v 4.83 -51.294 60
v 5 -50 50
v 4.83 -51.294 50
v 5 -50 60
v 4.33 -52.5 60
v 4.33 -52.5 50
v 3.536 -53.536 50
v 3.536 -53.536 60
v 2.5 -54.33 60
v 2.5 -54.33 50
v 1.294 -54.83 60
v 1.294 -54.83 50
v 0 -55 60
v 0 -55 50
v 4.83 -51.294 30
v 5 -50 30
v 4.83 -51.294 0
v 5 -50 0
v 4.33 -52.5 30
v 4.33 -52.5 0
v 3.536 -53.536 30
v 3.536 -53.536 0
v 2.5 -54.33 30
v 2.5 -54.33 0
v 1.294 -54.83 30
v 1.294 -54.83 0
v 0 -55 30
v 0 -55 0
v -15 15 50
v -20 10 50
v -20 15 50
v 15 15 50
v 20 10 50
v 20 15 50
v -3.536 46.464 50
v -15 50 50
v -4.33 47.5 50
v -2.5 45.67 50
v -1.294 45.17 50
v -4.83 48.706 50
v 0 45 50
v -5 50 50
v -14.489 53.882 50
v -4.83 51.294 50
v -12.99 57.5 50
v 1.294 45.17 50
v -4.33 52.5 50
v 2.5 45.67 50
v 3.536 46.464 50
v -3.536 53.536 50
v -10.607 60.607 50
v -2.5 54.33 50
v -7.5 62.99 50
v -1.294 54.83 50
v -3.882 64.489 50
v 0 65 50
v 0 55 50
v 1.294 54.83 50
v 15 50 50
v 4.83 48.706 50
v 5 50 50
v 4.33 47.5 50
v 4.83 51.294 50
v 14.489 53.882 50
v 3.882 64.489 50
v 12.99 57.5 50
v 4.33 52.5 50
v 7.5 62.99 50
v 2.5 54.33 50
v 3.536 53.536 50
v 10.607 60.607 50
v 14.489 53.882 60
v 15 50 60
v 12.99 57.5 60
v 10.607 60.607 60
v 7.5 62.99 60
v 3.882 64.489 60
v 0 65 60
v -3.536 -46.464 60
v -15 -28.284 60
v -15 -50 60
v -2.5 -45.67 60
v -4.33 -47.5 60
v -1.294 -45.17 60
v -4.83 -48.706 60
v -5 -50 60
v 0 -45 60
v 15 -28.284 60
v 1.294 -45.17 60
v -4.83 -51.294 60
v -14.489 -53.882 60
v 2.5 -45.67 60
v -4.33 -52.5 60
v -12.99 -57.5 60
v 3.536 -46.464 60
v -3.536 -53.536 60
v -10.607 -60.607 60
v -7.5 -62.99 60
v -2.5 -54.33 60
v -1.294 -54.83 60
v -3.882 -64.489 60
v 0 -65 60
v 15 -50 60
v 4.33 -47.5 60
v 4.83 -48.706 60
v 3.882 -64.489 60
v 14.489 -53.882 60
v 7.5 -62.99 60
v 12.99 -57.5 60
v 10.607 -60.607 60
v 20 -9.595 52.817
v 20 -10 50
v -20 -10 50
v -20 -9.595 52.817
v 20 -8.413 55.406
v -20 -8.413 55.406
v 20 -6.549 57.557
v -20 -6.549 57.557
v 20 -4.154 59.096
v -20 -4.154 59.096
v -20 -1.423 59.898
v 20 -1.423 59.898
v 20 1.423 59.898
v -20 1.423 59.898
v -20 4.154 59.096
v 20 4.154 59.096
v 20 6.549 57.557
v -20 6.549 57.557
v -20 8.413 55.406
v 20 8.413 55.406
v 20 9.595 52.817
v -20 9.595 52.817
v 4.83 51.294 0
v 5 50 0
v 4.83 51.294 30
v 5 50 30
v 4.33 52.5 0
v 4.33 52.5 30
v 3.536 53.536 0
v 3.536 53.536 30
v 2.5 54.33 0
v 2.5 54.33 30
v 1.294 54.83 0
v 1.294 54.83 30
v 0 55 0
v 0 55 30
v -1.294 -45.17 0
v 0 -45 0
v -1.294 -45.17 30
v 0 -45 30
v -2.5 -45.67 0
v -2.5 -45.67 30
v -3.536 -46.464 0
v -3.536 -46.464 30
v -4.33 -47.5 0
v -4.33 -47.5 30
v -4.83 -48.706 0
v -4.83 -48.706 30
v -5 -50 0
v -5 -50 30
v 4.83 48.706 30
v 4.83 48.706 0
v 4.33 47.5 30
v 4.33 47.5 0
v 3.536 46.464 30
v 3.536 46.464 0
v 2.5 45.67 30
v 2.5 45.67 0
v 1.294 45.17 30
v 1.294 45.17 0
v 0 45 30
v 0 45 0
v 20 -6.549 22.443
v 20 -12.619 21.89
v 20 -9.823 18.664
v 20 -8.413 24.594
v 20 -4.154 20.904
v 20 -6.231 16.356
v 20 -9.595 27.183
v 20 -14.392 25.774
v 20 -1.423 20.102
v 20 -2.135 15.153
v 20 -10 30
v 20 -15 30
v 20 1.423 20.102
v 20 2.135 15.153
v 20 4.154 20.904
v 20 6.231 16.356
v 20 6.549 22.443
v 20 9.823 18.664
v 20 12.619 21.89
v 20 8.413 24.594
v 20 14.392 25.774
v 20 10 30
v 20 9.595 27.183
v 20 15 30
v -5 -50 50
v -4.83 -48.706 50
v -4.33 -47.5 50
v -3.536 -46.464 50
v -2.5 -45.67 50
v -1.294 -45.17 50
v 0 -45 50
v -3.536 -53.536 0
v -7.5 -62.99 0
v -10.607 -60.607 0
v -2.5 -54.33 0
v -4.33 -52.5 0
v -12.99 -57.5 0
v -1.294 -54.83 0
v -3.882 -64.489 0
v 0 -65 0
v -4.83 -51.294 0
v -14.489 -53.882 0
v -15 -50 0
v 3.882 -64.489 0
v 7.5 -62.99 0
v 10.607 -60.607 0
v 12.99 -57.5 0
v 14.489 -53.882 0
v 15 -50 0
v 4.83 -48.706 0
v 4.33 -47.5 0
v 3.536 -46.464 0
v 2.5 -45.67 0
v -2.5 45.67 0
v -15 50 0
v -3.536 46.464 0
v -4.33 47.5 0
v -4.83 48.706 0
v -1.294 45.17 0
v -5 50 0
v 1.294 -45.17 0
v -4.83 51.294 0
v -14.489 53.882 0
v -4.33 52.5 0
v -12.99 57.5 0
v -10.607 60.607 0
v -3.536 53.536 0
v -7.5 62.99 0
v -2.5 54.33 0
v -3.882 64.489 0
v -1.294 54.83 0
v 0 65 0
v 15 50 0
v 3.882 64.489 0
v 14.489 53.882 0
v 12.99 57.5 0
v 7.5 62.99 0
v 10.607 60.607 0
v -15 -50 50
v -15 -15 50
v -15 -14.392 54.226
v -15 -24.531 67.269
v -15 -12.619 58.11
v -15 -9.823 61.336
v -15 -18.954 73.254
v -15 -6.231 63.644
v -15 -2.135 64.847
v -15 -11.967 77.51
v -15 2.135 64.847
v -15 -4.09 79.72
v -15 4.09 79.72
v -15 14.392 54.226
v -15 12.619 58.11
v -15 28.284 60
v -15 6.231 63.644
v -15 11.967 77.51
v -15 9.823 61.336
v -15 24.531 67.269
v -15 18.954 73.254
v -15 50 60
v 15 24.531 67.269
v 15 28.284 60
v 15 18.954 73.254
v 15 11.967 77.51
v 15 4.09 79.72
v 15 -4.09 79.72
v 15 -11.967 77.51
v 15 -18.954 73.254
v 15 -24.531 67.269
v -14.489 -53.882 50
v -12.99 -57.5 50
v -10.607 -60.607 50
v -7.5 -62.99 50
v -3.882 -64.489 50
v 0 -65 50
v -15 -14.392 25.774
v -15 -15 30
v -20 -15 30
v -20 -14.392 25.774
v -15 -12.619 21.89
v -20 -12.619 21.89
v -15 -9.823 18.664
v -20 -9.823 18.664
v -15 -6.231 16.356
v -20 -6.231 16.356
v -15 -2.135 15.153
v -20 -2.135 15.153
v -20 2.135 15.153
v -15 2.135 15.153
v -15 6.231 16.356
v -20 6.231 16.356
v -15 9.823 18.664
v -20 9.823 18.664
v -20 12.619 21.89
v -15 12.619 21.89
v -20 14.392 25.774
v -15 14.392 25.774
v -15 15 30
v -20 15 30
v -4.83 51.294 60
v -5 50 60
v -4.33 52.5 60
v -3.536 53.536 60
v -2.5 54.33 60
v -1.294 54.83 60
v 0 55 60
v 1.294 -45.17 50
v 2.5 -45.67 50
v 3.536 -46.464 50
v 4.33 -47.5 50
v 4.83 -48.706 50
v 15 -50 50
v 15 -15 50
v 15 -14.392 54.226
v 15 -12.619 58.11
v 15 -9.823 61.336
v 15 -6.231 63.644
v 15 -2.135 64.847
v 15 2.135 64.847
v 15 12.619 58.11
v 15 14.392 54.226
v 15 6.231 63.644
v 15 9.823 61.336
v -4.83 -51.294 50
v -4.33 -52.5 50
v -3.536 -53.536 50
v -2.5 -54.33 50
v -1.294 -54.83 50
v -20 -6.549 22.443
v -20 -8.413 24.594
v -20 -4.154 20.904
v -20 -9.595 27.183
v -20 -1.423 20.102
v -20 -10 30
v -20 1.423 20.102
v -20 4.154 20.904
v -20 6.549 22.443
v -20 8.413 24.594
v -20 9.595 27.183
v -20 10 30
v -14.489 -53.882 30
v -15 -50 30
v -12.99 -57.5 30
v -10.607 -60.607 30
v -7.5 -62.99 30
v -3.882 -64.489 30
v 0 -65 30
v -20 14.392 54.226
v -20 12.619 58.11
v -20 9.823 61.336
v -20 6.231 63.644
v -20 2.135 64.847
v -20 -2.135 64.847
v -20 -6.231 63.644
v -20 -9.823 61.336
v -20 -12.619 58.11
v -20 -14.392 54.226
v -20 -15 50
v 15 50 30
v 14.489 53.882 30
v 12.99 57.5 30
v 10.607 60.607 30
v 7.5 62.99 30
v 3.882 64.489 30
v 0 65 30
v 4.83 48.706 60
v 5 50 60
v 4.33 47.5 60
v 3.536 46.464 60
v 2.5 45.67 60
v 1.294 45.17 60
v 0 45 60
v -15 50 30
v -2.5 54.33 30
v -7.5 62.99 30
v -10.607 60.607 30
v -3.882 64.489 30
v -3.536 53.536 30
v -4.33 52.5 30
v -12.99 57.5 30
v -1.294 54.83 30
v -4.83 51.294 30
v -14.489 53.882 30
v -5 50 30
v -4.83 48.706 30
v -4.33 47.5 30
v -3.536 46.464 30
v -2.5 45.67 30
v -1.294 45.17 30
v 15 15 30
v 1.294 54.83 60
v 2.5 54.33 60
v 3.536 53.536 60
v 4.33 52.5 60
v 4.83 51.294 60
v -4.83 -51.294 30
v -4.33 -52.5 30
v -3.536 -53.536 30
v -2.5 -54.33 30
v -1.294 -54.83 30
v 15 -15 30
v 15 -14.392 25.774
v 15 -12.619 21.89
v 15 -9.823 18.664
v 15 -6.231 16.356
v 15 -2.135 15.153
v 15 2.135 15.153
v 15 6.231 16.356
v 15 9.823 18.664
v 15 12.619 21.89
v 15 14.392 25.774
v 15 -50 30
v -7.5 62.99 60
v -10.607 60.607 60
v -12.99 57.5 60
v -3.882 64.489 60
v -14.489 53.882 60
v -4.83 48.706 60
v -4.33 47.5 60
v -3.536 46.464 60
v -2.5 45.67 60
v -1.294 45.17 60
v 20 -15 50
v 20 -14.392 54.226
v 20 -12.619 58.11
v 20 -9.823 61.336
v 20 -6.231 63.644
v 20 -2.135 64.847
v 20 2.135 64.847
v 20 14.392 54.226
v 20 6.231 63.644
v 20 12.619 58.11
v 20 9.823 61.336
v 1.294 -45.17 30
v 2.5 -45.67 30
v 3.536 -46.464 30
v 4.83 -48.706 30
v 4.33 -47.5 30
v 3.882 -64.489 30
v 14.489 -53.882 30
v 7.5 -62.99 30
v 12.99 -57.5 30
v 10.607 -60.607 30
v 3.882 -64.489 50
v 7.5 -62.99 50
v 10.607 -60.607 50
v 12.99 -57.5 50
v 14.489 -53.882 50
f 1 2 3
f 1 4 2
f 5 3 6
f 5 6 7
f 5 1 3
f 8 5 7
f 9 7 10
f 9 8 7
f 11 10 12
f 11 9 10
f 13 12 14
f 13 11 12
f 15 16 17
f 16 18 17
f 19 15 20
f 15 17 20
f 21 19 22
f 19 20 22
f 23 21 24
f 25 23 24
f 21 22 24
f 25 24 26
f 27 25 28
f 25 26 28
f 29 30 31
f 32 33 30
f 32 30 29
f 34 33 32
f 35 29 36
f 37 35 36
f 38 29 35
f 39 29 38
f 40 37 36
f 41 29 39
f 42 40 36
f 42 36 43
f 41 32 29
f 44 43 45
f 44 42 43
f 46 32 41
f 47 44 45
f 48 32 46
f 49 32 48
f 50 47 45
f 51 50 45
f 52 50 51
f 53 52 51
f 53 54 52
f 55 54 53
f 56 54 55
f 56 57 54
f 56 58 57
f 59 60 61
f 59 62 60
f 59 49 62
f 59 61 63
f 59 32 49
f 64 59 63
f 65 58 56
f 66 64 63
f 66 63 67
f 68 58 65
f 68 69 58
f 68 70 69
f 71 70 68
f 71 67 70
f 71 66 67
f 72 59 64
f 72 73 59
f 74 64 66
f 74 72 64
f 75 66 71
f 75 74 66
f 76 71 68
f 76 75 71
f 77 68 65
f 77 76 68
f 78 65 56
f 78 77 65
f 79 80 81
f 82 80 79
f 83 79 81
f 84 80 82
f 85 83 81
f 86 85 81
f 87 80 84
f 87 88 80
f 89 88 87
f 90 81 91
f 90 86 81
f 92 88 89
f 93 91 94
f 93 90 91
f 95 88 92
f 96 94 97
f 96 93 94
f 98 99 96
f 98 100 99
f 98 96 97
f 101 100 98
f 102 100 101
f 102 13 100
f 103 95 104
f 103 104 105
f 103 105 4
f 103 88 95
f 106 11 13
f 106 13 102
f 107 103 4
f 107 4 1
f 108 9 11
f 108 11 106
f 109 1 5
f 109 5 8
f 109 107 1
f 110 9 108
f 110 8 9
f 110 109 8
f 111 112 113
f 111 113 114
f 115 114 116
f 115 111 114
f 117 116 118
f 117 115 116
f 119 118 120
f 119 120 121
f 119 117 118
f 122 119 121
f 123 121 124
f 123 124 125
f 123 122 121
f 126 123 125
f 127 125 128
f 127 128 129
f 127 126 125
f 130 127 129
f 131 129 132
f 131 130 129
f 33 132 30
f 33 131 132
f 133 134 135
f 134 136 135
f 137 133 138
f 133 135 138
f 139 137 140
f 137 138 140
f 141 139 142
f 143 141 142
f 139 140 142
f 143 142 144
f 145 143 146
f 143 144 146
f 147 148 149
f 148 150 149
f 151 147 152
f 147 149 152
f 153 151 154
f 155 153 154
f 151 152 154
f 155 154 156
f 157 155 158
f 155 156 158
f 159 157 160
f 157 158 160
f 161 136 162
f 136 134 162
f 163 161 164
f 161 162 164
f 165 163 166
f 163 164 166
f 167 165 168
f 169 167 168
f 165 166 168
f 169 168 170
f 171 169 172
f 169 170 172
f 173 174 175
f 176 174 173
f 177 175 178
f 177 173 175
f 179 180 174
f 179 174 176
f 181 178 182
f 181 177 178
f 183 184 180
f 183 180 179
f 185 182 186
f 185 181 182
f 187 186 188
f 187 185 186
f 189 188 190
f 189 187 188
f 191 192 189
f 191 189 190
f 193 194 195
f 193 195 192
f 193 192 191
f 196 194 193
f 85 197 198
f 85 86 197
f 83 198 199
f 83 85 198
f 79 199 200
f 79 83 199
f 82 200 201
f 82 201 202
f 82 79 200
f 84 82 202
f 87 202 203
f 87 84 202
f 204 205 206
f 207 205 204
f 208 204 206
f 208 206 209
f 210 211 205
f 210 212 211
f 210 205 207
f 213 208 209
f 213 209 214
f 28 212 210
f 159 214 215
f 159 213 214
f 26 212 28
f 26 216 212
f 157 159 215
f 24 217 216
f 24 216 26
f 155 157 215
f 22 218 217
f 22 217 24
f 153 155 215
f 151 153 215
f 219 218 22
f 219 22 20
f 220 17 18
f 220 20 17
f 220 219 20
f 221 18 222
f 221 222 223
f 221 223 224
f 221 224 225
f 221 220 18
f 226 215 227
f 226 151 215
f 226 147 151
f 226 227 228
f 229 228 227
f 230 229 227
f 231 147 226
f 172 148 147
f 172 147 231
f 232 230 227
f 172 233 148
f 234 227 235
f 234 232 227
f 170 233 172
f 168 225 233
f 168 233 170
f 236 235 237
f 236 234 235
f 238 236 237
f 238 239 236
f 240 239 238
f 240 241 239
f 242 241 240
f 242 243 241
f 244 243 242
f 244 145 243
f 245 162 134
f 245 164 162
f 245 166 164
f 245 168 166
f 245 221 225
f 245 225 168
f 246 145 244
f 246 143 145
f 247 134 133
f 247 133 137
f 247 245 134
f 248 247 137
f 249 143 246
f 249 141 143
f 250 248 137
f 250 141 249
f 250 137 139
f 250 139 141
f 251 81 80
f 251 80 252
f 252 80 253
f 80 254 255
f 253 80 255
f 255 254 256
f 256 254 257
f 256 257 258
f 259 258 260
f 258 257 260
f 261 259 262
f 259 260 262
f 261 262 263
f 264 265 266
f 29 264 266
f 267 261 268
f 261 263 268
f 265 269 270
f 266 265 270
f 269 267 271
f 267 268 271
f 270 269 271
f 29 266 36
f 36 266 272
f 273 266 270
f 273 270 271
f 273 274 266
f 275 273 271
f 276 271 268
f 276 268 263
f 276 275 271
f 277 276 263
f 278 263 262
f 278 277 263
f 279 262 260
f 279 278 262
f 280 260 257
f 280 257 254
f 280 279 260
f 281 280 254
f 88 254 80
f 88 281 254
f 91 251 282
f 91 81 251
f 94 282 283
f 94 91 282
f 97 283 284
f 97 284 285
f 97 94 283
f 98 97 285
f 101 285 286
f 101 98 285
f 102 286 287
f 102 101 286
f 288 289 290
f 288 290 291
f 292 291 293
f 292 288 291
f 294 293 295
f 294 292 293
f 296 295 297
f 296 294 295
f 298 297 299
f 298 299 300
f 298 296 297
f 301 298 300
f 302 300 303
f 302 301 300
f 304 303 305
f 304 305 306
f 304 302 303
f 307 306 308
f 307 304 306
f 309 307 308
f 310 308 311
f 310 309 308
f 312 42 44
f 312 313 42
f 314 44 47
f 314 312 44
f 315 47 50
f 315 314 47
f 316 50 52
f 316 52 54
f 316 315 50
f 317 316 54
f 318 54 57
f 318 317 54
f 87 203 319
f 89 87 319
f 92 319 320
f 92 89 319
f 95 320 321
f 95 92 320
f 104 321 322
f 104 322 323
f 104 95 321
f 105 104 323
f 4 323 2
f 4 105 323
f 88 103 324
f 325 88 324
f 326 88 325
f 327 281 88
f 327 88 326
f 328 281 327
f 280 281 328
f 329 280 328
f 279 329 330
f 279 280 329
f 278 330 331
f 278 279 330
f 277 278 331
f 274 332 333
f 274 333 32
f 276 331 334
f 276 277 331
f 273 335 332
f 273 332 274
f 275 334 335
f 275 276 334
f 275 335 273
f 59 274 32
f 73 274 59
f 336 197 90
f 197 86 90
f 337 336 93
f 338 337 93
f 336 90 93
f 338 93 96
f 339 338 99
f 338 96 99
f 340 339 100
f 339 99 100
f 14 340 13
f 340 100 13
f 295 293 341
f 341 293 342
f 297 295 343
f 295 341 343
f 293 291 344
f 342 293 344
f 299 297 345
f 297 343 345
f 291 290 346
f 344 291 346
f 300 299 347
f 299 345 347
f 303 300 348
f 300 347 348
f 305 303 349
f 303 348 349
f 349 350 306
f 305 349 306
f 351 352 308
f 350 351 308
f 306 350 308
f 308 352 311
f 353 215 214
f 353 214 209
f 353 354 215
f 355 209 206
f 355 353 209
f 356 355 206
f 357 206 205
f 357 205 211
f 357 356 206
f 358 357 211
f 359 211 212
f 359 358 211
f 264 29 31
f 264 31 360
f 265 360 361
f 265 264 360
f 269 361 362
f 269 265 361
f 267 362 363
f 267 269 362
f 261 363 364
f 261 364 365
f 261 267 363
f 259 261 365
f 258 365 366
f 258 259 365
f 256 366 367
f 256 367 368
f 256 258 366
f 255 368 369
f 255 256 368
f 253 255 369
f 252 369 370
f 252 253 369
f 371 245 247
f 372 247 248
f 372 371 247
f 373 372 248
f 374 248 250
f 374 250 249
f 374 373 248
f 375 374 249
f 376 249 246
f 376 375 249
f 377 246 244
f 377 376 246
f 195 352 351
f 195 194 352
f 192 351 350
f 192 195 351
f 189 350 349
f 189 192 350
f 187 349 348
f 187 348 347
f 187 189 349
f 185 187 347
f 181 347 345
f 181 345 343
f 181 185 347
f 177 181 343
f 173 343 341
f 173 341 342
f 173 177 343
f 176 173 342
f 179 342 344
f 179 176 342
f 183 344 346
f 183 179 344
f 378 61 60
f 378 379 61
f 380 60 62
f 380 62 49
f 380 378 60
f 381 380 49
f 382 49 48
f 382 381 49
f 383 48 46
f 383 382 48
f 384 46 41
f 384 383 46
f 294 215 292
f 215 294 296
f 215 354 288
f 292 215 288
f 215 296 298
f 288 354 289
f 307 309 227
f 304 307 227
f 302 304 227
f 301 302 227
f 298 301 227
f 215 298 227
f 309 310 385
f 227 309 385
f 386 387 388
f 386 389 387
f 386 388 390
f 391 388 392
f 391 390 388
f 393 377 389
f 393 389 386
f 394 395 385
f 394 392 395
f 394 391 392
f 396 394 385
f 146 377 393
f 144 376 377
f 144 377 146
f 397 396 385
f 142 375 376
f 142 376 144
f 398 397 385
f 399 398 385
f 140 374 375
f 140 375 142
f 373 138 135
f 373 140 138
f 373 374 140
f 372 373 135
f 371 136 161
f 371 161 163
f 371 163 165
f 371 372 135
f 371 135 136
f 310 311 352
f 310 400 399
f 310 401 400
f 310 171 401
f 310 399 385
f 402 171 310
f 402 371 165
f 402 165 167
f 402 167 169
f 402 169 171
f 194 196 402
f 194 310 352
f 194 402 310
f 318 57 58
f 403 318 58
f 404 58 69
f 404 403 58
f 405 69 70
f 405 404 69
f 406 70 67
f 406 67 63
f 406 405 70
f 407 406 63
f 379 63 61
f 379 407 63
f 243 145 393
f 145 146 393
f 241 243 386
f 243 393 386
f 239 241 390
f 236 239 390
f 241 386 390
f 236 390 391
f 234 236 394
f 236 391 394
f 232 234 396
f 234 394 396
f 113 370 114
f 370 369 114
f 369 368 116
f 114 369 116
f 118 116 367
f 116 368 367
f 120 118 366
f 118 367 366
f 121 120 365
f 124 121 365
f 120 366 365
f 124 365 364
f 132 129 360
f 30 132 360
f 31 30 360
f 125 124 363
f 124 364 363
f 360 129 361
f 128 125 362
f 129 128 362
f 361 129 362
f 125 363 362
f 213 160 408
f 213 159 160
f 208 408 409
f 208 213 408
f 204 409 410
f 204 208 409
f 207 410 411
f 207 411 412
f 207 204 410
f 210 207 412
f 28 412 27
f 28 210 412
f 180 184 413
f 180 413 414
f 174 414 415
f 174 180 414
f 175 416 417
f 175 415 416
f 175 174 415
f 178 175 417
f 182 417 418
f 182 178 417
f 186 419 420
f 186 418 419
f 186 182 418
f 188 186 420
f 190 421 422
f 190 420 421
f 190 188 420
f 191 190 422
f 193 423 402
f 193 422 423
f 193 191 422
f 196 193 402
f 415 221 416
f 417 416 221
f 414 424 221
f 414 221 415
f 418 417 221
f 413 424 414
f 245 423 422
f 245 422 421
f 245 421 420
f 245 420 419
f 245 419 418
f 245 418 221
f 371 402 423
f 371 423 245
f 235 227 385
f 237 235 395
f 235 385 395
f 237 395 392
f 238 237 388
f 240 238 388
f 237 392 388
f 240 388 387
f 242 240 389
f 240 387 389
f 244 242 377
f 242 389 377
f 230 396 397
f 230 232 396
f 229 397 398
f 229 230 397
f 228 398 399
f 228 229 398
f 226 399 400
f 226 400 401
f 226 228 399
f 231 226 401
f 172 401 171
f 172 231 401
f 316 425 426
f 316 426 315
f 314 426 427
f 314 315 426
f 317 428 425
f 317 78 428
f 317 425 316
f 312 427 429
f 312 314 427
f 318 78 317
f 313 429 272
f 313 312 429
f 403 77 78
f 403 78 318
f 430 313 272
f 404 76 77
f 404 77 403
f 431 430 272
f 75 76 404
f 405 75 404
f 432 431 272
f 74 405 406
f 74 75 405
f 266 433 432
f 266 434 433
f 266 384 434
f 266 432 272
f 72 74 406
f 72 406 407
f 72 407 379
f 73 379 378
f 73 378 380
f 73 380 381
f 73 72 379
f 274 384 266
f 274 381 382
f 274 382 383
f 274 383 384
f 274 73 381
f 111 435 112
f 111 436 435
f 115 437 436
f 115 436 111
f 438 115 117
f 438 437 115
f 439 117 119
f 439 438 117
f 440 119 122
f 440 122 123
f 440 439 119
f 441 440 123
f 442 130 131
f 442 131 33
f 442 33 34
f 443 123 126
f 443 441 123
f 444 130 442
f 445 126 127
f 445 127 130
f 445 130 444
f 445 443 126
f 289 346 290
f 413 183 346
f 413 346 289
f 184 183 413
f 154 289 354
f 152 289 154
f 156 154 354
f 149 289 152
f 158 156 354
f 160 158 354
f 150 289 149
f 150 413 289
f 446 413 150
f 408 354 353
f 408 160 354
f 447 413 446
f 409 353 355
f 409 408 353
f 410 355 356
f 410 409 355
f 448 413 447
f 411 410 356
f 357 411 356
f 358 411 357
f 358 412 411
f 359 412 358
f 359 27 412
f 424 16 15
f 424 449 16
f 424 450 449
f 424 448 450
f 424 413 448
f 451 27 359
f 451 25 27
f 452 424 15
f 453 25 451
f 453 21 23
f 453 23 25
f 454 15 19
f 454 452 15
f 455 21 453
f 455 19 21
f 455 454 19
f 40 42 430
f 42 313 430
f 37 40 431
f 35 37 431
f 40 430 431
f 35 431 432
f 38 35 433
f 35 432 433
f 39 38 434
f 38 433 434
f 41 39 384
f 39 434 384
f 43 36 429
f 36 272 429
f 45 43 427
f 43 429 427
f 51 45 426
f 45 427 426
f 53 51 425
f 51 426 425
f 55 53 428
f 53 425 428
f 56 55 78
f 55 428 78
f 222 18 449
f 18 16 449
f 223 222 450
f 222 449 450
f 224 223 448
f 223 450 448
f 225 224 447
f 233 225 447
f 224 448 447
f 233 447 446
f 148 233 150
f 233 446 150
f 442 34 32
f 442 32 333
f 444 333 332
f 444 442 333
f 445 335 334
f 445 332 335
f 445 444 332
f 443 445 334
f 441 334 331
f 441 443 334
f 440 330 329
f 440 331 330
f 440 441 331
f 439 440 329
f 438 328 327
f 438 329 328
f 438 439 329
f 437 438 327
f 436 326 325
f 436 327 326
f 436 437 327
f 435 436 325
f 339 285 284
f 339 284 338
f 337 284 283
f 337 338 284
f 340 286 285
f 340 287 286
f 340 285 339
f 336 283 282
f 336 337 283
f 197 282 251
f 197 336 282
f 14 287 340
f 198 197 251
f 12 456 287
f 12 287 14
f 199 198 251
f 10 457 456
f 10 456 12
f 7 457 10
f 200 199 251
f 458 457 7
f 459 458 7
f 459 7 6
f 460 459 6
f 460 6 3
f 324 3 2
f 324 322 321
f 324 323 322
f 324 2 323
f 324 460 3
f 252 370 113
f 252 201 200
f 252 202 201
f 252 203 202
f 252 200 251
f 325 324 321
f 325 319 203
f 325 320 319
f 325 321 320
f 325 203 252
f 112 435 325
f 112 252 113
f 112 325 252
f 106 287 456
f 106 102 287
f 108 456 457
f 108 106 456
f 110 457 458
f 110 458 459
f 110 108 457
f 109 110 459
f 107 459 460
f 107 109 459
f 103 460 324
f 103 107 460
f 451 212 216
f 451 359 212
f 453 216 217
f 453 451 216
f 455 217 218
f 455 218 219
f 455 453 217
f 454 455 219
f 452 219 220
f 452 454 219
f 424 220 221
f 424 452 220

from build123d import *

# Parameters (mm, degrees)
F1_DEPTH = 20
F0_W     = 10
F0_H     = 10
F2_DEPTH = 15
F0_H_2   = 30
F3_DEPTH = 5
F4_R     = 4.99999
F4_2_R   = 4.99999
F5_R     = 14.99999
F5_2_R   = 14.99999


# Not quite as in the source:
# - a fillet or chamfer is up to 0.001 mm smaller than in the source, because OpenCascade refuses the exact size


with BuildPart() as f1:
    # F0 (on Right) → F1 (new body, symmetric)
    with BuildSketch(Plane.YZ):
        with BuildLine():
            Line((-15, 50), (-10, 50))
            ThreePointArc((-10, 50), (0, 60), (10, 50))
            Line((10, 50), (15, 50))
            ThreePointArc((15, 50), (0, 65), (-15, 50))
        make_face()
    extrude(amount=F1_DEPTH, both=True)

    # F0 (on Right) → F2 (join, symmetric)
    with BuildSketch(Plane.YZ):
        with Locations((-60, 55)):
            Rectangle(F0_W, F0_H)
        with BuildLine():
            Line((-45, 50), (-15, 50))
            ThreePointArc((-15, 50), (0, 65), (15, 50))
            Line((15, 50), (45, 50))
            Line((45, 50), (45, 60))
            Line((45, 60), (28.2842712475, 60))
            ThreePointArc((28.2842712475, 60), (0, 80), (-28.2842712475, 60))
            Line((-28.2842712475, 60), (-45, 60))
            Line((-45, 60), (-45, 50))
        make_face()
        with Locations((-50, 55)):
            Rectangle(F0_W, F0_H)
        with Locations((50, 55)):
            Rectangle(F0_W, F0_H)
        with Locations((60, 55)):
            Rectangle(F0_W, F0_H)
    extrude(amount=F2_DEPTH, both=True)


with BuildPart() as f1b:
    # F0 (on Right) → F1, piece 2 (new body, symmetric)
    with BuildSketch(Plane.YZ):
        with BuildLine():
            Line((-10, 30), (-15, 30))
            ThreePointArc((-15, 30), (0, 15), (15, 30))
            Line((15, 30), (10, 30))
            ThreePointArc((10, 30), (0, 20), (-10, 30))
        make_face()
    extrude(amount=F1_DEPTH, both=True)

    # F0 (on Right) → F2, piece 2 (join, symmetric)
    with BuildSketch(Plane.YZ):
        with BuildLine():
            Line((-45, 30), (-45, 0))
            Line((-45, 0), (0, 0))
            Line((0, 0), (45, 0))
            Line((45, 0), (45, 30))
            Line((45, 30), (15, 30))
            ThreePointArc((15, 30), (0, 15), (-15, 30))
            Line((-15, 30), (-45, 30))
        make_face()
        Polygon((45, 30), (45, 0), (50, 0), (55, 0), (55, 30), (50, 30), align=None)
        with Locations((60, 15)):
            Rectangle(F0_W, F0_H_2)
        Polygon((-55, 30), (-55, 0), (-50, 0), (-45, 0), (-45, 30), (-50, 30), align=None)
        with Locations((-60, 15)):
            Rectangle(F0_W, F0_H_2)
    extrude(amount=F2_DEPTH, both=True)


with BuildPart() as f3_tool:
    # F0 (on Right) → F3 (new body, symmetric)
    with BuildSketch(Plane.YZ):
        with Locations((-50, 55)):
            Rectangle(F0_W, F0_H)
        Polygon((-55, 30), (-55, 0), (-50, 0), (-45, 0), (-45, 30), (-50, 30), align=None)
        with Locations((50, 55)):
            Rectangle(F0_W, F0_H)
        Polygon((45, 30), (45, 0), (50, 0), (55, 0), (55, 30), (50, 30), align=None)
    extrude(amount=F3_DEPTH, both=True)


with BuildPart() as f1_1:
    add(f1.part)

    # F3: cut by f3_tool
    add(f3_tool.part, mode=Mode.SUBTRACT)

    # F4 (radius 5 in the source; OpenCascade refuses exactly that, so slightly less here)
    f4_edges = [f1_1.edges().sort_by_distance(p)[0] for p in [
        (-5, -45, 55),
        (-5, 55, 55),
        (-5, -55, 55),
        (-5, 45, 55),
        (5, -55, 55),
        (5, 45, 55),
        (5, 55, 55),
        (5, -45, 55),
    ]]
    fillet(f4_edges, radius=F4_R)

    # F5#2 (radius 15 in the source; OpenCascade refuses exactly that, so slightly less here)
    f5_2_edges = [f1_1.edges().sort_by_distance(p)[0] for p in [
        (-15, -65, 55),
        (15, -65, 55),
        (15, 65, 55),
        (-15, 65, 55),
    ]]
    fillet(f5_2_edges, radius=F5_2_R)


with BuildPart() as f1b_1:
    add(f1b.part)

    # F3: cut by f3_tool
    add(f3_tool.part, mode=Mode.SUBTRACT)

    # F4#2 (radius 5 in the source; OpenCascade refuses exactly that, so slightly less here)
    f4_2_edges = [f1b_1.edges().sort_by_distance(p)[0] for p in [
        (-5, 55, 15),
        (-5, -45, 15),
        (-5, -55, 15),
        (-5, 45, 15),
        (5, -55, 15),
        (5, -45, 15),
        (5, 55, 15),
        (5, 45, 15),
    ]]
    fillet(f4_2_edges, radius=F4_2_R)

    # F5 (radius 15 in the source; OpenCascade refuses exactly that, so slightly less here)
    f5_edges = [f1b_1.edges().sort_by_distance(p)[0] for p in [
        (15, -65, 15),
        (-15, -65, 15),
        (15, 65, 15),
        (-15, 65, 15),
    ]]
    fillet(f5_edges, radius=F5_R)


solid = Compound([f1_1.part, f1b_1.part])
